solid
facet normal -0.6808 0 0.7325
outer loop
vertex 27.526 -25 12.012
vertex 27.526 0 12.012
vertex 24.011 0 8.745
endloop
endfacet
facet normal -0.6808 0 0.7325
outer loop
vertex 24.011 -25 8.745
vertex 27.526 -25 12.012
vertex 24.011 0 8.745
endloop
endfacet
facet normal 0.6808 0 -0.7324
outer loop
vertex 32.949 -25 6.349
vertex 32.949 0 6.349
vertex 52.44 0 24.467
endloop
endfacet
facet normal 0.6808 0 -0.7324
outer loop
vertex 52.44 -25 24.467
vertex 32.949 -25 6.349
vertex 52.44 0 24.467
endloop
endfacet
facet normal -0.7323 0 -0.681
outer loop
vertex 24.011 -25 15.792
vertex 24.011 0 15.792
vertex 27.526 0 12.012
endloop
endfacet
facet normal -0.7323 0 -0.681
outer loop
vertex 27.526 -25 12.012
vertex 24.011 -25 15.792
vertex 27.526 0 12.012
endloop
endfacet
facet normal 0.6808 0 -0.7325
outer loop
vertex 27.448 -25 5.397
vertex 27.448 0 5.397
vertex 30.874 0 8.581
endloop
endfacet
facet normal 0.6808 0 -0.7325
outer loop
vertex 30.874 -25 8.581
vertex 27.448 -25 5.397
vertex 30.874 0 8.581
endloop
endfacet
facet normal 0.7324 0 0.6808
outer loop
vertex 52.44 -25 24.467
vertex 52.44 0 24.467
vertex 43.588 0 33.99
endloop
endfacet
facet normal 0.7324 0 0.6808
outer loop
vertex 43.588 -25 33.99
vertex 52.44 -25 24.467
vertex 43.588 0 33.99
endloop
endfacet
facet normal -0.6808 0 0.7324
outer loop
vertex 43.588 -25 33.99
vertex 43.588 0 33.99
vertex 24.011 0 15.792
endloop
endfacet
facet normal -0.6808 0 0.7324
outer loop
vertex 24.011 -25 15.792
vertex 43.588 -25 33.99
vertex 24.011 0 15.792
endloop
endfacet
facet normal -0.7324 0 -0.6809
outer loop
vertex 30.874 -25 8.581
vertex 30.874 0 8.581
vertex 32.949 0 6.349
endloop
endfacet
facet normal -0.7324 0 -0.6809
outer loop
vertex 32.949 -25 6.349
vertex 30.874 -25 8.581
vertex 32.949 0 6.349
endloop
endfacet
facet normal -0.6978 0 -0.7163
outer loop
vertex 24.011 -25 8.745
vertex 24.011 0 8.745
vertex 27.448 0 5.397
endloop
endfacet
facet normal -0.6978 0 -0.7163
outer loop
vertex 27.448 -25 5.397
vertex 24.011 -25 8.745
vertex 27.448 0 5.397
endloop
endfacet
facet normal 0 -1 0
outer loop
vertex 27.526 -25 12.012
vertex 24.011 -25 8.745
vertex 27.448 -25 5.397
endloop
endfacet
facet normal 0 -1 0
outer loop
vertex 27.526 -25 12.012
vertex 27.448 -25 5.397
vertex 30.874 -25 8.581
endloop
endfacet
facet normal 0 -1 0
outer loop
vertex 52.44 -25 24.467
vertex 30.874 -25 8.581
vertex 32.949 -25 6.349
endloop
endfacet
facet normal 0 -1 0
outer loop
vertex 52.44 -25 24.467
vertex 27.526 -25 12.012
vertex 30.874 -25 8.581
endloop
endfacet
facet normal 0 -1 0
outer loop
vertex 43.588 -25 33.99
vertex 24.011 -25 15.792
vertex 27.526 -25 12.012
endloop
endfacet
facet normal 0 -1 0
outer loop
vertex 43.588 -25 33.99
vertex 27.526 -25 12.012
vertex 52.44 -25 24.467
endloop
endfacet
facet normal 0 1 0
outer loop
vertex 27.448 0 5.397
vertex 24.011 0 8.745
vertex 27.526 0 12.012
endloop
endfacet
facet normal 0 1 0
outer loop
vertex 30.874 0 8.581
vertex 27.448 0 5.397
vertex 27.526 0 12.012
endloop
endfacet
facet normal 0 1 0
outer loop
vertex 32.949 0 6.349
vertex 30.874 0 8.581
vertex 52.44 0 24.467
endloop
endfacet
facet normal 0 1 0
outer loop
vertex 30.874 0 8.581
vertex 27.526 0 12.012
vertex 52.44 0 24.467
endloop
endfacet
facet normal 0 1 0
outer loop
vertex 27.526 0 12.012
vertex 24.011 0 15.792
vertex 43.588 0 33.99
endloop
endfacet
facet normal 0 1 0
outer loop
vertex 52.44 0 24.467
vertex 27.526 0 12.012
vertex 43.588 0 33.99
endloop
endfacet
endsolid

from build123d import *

# Parameters (mm, degrees)
F0_W     = 4.2024515569
F0_H     = 12.3226391152
F1_DEPTH = 25


with BuildPart() as f1:
    # F0 (on Front) → F1 (new body)
    with BuildSketch(Plane.XZ):
        with Locations((22.6418208331, -0.4750718363)):
            Rectangle(F0_W, F0_H)
    extrude(amount=F1_DEPTH)


with BuildPart() as f1b:
    # F0 (on Front) → F1, piece 2 (new body)
    with BuildSketch(Plane.XZ):
        Polygon((52.4395957523, 24.4672579743), (43.5876576167, 33.9897979507), (24.0114504894, 15.7921978513), (27.5258704588, 12.0115337595), (24.0114504894, 8.7446083143), (27.4481885135, 5.3967726417), (30.8740026641, 8.5813321185), (32.9489489509, 6.3491928217), align=None)
    extrude(amount=F1_DEPTH)


solid = f1b.part
